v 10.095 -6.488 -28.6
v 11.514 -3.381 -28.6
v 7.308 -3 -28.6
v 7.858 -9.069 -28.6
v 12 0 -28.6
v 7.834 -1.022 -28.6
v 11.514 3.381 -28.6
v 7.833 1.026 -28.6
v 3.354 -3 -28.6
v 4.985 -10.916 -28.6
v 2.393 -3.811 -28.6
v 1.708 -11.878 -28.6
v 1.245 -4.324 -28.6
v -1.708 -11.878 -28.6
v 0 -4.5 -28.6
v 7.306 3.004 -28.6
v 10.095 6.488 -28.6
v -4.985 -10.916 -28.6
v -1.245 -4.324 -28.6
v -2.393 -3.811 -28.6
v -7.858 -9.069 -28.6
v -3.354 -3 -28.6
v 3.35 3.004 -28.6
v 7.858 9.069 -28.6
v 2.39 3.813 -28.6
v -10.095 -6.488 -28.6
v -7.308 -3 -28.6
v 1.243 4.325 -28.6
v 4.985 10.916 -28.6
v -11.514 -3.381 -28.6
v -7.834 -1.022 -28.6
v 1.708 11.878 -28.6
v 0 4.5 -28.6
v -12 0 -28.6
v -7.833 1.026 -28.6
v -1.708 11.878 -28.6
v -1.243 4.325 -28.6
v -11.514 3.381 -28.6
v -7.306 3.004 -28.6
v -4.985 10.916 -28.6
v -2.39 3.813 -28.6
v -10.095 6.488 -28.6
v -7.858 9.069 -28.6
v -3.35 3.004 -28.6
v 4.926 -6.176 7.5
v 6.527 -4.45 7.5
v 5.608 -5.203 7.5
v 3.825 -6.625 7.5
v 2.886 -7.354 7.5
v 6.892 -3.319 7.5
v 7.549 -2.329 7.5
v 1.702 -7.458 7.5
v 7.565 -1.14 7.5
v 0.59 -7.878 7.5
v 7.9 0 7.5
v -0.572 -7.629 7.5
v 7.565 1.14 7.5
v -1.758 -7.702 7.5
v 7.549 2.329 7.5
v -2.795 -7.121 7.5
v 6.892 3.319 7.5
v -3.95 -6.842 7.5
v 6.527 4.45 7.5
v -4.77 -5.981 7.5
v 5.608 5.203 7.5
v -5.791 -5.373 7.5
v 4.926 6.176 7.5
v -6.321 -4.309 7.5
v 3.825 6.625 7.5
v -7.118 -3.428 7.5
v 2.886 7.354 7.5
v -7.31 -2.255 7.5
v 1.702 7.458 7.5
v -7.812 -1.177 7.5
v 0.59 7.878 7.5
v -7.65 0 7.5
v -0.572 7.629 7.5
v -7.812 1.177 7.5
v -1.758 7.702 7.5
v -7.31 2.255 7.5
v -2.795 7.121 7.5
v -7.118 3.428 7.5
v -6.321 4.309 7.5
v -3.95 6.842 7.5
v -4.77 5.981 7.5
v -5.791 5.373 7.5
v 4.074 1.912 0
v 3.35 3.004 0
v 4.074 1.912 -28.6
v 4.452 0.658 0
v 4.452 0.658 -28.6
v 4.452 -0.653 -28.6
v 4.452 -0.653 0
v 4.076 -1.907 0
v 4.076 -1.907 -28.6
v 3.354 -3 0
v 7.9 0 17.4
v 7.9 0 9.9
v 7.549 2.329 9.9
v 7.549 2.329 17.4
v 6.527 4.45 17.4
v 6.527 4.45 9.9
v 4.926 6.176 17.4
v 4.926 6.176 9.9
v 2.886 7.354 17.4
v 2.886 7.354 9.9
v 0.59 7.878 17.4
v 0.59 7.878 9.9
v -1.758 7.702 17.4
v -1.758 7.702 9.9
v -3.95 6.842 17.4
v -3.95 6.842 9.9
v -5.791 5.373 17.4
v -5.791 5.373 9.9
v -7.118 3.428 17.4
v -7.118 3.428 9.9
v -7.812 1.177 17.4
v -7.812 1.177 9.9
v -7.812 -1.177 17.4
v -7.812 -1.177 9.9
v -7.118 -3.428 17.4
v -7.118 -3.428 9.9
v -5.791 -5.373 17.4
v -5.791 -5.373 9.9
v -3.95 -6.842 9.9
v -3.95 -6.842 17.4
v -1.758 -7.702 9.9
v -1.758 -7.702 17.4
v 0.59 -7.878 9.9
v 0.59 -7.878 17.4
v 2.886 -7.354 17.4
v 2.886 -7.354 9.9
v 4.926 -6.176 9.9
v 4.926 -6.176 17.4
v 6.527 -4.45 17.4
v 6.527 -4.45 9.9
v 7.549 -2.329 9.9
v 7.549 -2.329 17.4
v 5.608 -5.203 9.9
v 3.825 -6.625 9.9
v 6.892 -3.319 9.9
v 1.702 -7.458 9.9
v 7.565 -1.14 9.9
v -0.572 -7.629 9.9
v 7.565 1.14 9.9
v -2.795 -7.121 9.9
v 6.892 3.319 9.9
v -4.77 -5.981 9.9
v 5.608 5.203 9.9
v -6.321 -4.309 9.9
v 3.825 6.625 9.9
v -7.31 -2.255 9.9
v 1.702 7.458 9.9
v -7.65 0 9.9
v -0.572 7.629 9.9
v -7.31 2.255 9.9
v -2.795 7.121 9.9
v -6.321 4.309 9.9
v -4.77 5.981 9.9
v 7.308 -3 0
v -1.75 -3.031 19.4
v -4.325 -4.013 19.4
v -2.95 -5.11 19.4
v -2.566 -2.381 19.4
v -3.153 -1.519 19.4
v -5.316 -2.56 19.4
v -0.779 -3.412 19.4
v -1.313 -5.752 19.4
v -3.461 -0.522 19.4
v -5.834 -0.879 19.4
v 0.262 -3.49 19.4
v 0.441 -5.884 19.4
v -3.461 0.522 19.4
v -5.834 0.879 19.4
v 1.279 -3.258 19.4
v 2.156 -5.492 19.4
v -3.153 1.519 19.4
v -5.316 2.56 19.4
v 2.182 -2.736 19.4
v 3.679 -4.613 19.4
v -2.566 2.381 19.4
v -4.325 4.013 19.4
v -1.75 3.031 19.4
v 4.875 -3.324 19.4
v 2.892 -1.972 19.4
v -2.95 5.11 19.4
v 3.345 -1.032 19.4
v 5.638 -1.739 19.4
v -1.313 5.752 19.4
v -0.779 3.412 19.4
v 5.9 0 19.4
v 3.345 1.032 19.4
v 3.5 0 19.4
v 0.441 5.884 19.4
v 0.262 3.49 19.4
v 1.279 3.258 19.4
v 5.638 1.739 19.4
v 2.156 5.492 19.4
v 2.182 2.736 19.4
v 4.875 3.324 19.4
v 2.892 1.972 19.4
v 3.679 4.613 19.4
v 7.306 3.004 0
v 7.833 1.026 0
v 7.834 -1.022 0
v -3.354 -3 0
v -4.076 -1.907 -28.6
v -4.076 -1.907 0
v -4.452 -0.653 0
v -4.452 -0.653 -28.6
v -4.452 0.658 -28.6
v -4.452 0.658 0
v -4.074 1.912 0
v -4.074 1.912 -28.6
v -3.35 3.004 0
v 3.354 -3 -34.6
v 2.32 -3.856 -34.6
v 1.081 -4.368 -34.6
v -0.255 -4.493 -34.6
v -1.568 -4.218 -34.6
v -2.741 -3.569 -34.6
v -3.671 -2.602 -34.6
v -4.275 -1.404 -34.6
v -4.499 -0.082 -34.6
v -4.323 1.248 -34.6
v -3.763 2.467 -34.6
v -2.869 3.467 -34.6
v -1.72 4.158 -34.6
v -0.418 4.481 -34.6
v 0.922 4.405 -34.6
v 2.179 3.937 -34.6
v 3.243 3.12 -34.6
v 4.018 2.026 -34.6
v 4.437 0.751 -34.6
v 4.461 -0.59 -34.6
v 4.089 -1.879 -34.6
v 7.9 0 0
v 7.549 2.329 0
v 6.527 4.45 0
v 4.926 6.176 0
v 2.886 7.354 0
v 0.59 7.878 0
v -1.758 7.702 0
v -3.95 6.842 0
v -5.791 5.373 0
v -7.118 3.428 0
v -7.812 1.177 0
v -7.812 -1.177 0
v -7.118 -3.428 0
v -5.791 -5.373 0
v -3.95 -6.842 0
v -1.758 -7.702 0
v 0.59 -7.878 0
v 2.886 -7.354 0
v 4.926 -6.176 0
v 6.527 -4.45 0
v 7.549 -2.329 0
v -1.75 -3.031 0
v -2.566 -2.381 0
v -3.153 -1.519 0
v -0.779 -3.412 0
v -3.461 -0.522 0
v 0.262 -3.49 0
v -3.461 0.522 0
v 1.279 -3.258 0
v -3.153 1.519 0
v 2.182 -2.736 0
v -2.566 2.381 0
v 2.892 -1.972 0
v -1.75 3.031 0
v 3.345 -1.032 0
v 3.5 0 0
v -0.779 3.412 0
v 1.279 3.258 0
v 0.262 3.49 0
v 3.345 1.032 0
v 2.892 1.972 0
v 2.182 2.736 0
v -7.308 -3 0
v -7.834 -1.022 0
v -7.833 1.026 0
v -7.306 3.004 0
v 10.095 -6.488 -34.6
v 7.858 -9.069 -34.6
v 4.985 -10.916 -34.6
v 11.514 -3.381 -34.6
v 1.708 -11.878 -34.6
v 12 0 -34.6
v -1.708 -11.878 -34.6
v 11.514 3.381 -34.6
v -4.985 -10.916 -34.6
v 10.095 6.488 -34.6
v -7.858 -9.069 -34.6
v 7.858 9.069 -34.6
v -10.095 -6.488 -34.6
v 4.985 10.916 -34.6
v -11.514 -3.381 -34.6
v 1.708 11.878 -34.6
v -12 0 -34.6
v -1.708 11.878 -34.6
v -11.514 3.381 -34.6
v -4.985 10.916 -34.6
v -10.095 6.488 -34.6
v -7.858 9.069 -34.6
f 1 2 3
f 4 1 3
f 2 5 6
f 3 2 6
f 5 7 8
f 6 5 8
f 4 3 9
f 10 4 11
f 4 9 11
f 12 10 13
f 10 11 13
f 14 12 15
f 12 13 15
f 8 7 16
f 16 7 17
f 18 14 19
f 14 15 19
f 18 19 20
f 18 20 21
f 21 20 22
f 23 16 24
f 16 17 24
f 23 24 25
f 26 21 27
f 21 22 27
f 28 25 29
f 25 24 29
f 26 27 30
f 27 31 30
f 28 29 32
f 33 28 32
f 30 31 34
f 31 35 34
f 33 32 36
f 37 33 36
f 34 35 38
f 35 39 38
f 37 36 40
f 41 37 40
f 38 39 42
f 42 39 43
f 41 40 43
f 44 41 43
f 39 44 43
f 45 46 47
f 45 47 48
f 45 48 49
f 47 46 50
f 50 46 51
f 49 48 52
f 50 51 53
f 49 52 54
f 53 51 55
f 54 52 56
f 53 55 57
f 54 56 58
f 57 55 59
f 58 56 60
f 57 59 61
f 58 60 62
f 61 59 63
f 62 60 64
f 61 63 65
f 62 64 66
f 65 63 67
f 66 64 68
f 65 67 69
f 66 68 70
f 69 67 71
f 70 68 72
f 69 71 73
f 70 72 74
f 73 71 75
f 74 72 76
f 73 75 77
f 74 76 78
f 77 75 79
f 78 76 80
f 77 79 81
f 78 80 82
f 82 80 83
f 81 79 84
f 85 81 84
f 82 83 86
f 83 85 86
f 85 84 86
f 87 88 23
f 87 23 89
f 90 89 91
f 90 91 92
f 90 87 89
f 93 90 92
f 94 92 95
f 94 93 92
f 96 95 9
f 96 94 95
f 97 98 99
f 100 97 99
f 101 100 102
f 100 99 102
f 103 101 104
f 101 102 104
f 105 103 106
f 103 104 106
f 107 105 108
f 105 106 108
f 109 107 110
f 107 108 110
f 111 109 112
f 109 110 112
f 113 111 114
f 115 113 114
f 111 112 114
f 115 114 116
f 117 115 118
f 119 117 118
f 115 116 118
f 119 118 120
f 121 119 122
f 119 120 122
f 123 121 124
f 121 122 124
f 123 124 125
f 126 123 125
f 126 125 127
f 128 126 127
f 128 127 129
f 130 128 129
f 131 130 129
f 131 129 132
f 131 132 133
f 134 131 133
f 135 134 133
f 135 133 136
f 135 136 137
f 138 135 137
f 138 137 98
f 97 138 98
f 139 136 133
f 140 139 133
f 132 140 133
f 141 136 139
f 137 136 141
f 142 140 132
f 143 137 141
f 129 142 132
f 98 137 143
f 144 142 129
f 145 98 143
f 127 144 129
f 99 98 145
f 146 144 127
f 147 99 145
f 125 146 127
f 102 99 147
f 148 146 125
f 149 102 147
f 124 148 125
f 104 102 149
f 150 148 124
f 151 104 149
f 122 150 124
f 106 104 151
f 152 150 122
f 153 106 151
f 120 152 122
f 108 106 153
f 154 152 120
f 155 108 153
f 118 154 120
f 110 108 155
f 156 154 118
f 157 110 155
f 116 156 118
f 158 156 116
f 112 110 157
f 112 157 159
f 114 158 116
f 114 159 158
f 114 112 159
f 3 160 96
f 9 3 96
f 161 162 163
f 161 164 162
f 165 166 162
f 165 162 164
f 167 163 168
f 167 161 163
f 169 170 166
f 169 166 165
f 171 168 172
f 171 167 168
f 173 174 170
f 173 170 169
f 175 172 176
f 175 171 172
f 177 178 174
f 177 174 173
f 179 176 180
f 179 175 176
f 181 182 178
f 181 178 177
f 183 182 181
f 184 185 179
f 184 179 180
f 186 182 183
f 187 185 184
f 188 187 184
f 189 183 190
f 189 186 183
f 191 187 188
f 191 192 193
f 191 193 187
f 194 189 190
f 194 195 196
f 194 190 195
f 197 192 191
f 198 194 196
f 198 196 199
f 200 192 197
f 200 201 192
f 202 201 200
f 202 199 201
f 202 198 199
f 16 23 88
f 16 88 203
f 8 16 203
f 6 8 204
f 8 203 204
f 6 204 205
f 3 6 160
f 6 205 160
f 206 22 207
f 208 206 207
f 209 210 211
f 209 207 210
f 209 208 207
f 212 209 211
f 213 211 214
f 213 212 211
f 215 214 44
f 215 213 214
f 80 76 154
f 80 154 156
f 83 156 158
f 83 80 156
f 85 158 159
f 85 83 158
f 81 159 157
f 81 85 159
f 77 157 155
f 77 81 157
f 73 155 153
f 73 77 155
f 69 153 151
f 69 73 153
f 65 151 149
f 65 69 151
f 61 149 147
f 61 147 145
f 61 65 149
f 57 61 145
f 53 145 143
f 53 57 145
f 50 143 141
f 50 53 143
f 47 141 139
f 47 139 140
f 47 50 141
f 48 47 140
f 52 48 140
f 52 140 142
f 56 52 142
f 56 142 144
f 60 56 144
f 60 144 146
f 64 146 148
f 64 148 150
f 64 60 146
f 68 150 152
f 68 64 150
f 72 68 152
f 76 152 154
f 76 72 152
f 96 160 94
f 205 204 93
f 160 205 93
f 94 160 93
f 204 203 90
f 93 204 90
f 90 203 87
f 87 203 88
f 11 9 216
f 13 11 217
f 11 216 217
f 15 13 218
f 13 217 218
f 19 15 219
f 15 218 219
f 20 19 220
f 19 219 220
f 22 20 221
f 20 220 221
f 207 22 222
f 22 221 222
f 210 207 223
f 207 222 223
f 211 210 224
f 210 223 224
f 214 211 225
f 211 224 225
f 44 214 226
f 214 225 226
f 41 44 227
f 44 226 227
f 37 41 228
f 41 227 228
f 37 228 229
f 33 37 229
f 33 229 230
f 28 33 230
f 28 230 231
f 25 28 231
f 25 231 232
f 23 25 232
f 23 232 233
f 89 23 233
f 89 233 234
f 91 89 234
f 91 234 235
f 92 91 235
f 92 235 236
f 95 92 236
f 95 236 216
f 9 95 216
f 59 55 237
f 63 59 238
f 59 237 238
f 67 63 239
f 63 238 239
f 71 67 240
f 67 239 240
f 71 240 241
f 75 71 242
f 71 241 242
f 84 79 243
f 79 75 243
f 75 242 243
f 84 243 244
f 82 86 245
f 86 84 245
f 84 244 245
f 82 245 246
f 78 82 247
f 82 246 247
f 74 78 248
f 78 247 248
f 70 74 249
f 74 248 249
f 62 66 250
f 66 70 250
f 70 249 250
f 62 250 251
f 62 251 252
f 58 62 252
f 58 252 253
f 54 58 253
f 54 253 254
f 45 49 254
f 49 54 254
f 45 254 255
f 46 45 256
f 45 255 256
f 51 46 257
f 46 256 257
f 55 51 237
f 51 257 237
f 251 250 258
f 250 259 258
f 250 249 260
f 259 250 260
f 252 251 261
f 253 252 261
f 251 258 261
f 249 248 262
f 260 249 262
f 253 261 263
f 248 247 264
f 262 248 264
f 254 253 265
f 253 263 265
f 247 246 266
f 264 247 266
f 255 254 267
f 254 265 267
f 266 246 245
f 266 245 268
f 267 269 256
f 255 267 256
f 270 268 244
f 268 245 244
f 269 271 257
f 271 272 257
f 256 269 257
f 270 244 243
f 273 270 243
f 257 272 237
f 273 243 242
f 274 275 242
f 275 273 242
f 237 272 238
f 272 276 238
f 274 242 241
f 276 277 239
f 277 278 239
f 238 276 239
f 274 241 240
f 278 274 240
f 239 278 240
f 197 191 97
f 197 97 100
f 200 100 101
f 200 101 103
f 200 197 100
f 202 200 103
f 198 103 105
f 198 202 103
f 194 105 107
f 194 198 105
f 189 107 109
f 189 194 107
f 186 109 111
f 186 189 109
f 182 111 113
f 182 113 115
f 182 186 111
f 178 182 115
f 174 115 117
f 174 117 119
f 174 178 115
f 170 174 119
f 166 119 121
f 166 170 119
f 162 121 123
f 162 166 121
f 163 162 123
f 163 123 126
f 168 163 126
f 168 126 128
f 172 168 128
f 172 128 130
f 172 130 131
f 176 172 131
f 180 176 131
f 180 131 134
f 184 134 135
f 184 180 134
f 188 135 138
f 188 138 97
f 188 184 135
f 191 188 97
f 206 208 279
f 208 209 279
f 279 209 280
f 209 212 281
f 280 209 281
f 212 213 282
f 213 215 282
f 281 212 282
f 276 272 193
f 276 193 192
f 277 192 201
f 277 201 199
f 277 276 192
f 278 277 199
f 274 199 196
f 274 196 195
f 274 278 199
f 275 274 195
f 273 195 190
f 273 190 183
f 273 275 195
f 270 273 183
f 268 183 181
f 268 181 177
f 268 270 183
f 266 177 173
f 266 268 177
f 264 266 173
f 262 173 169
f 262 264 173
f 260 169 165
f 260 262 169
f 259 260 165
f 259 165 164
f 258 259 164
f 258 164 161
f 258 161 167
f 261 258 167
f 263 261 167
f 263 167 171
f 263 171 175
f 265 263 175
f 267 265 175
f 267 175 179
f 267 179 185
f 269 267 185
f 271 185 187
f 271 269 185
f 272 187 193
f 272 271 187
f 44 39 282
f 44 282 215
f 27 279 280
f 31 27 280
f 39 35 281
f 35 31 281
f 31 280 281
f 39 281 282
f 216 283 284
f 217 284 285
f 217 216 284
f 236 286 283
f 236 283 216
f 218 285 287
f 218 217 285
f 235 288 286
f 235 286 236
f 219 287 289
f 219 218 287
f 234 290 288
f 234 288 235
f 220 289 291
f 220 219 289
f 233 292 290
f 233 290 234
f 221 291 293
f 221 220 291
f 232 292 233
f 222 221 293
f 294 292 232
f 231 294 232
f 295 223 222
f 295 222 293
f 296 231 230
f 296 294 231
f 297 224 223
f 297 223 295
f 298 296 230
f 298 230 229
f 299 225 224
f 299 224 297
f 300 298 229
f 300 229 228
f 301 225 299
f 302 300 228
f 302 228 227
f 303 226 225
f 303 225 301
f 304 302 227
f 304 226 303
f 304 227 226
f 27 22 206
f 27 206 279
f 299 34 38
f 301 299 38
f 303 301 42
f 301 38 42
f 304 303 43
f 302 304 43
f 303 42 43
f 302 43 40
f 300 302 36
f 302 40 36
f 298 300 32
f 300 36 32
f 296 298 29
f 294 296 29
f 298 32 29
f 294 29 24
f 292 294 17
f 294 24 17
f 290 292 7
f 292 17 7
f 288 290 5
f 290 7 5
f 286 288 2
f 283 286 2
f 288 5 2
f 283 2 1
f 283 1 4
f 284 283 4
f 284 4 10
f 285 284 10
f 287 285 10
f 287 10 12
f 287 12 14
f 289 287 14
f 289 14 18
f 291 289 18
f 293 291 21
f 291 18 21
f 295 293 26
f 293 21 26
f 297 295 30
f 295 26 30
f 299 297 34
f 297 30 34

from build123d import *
from build123d.topology import SkipClean

# Parameters (mm, degrees)
SKETCH1_R           = 7.9
SKETCH1_R_2         = 3.5
BOSS_EXTRUDE1_DEPTH = 19.4
CHAMFER1_SIZE       = 2
CUT_EXTRUDE6_START  = 2.4
SKETCH19_R          = 7.9
SKETCH19_R_2        = 7.65
CUT_EXTRUDE6_DEPTH  = 2.4
SKETCH20_R          = 7.9
SKETCH20_R_2        = 4.5
BOSS_EXTRUDE3_DEPTH = 28.6
CUT_EXTRUDE7_DEPTH  = 28.6
SKETCH22_R          = 12
BOSS_EXTRUDE4_DEPTH = 6
SKETCH23_R          = 4.5
CUT_EXTRUDE8_DEPTH  = 6


with BuildPart() as part:
    # Sketch1 → Boss-Extrude1 (new body)
    with BuildSketch(Plane.XY):
        Circle(SKETCH1_R)
        Circle(SKETCH1_R_2, mode=Mode.SUBTRACT)
    extrude(amount=BOSS_EXTRUDE1_DEPTH)

    # Chamfer1
    chamfer1_edges = [part.edges().sort_by_distance(p)[0] for p in [
        (-7.9, 0, 19.4),
    ]]
    chamfer(chamfer1_edges, length=CHAMFER1_SIZE)

    # Sketch19 → Cut-Extrude6 (cut)
    with BuildSketch(Plane(origin=(0, 0, 9.9), x_dir=(-1, 0, 0), z_dir=(0, 0, -1)).offset(CUT_EXTRUDE6_START)):
        Circle(SKETCH19_R)
        Circle(SKETCH19_R_2, mode=Mode.SUBTRACT)
    extrude(amount=-CUT_EXTRUDE6_DEPTH, mode=Mode.SUBTRACT)


with BuildPart() as body_2:
    # Sketch20 → Boss-Extrude3 (new body)
    with BuildSketch(Plane(origin=(0, 0, 0), x_dir=(-1, 0, 0), z_dir=(0, 0, -1))):
        Circle(SKETCH20_R)
        Circle(SKETCH20_R_2, mode=Mode.SUBTRACT)
    extrude(amount=BOSS_EXTRUDE3_DEPTH)

    # Sketch21 → Cut-Extrude7 (cut)
    with BuildSketch(Plane(origin=(0, 0, -28.6), x_dir=(-1, 0, 0), z_dir=(0, 0, -1))):
        with BuildLine():
            Line((0, 3.004177824), (-7.306498176, 3.004177824))
            ThreePointArc((-7.306498176, 3.004177824), (0, 7.9), (7.306498176, 3.004177824))
            Line((7.306498176, 3.004177824), (0, 3.004177824))
        make_face()
        with BuildLine():
            Line((-7.308050668, -3.000399212), (0, -3.000399212))
            Line((0, -3.000399212), (7.308050668, -3.000399212))
            ThreePointArc((7.308050668, -3.000399212), (0, -7.9), (-7.308050668, -3.000399212))
        make_face()
    extrude(amount=-CUT_EXTRUDE7_DEPTH, mode=Mode.SUBTRACT)


with BuildPart() as cut_extrude7_piece_1:
    # of the separate pieces the step leaves, piece 1, a body of its own (cut_extrude7_pieces)
    add(body_2.part.solids().sort_by_distance((-7.308050668, -3.000399212, 0))[0])



with BuildPart() as cut_extrude7_piece_2:
    # of the separate pieces the step leaves, piece 2, a body of its own (cut_extrude7_pieces)
    add(body_2.part.solids().sort_by_distance((7.306498176, 3.004177824, 0))[0])


with BuildPart() as cut_extrude7_piece_1_1:
    add(cut_extrude7_piece_1.part)

    add(cut_extrude7_piece_2.part)  # Boss-Extrude4 merges Cut-Extrude7 piece 2
    # Sketch22 → Boss-Extrude4 (add)
    with BuildSketch(Plane(origin=(0, 0, -28.6), x_dir=(-1, 0, 0), z_dir=(0, 0, -1))):
        Circle(SKETCH22_R)
    extrude(amount=BOSS_EXTRUDE4_DEPTH)

    # Sketch23 → Cut-Extrude8 (cut)
    with SkipClean():  # the faces are left unmerged after this step: merging them gives an invalid solid
        with BuildSketch(Plane(origin=(0, 0, -34.6), x_dir=(-1, 0, 0), z_dir=(0, 0, -1))):
            with Locations(Location((0, 0, 0), (0, 0, 221.817134721))):
                Circle(SKETCH23_R)
        extrude(amount=-CUT_EXTRUDE8_DEPTH, mode=Mode.SUBTRACT)


solid = Compound([part.part, cut_extrude7_piece_1_1.part])
